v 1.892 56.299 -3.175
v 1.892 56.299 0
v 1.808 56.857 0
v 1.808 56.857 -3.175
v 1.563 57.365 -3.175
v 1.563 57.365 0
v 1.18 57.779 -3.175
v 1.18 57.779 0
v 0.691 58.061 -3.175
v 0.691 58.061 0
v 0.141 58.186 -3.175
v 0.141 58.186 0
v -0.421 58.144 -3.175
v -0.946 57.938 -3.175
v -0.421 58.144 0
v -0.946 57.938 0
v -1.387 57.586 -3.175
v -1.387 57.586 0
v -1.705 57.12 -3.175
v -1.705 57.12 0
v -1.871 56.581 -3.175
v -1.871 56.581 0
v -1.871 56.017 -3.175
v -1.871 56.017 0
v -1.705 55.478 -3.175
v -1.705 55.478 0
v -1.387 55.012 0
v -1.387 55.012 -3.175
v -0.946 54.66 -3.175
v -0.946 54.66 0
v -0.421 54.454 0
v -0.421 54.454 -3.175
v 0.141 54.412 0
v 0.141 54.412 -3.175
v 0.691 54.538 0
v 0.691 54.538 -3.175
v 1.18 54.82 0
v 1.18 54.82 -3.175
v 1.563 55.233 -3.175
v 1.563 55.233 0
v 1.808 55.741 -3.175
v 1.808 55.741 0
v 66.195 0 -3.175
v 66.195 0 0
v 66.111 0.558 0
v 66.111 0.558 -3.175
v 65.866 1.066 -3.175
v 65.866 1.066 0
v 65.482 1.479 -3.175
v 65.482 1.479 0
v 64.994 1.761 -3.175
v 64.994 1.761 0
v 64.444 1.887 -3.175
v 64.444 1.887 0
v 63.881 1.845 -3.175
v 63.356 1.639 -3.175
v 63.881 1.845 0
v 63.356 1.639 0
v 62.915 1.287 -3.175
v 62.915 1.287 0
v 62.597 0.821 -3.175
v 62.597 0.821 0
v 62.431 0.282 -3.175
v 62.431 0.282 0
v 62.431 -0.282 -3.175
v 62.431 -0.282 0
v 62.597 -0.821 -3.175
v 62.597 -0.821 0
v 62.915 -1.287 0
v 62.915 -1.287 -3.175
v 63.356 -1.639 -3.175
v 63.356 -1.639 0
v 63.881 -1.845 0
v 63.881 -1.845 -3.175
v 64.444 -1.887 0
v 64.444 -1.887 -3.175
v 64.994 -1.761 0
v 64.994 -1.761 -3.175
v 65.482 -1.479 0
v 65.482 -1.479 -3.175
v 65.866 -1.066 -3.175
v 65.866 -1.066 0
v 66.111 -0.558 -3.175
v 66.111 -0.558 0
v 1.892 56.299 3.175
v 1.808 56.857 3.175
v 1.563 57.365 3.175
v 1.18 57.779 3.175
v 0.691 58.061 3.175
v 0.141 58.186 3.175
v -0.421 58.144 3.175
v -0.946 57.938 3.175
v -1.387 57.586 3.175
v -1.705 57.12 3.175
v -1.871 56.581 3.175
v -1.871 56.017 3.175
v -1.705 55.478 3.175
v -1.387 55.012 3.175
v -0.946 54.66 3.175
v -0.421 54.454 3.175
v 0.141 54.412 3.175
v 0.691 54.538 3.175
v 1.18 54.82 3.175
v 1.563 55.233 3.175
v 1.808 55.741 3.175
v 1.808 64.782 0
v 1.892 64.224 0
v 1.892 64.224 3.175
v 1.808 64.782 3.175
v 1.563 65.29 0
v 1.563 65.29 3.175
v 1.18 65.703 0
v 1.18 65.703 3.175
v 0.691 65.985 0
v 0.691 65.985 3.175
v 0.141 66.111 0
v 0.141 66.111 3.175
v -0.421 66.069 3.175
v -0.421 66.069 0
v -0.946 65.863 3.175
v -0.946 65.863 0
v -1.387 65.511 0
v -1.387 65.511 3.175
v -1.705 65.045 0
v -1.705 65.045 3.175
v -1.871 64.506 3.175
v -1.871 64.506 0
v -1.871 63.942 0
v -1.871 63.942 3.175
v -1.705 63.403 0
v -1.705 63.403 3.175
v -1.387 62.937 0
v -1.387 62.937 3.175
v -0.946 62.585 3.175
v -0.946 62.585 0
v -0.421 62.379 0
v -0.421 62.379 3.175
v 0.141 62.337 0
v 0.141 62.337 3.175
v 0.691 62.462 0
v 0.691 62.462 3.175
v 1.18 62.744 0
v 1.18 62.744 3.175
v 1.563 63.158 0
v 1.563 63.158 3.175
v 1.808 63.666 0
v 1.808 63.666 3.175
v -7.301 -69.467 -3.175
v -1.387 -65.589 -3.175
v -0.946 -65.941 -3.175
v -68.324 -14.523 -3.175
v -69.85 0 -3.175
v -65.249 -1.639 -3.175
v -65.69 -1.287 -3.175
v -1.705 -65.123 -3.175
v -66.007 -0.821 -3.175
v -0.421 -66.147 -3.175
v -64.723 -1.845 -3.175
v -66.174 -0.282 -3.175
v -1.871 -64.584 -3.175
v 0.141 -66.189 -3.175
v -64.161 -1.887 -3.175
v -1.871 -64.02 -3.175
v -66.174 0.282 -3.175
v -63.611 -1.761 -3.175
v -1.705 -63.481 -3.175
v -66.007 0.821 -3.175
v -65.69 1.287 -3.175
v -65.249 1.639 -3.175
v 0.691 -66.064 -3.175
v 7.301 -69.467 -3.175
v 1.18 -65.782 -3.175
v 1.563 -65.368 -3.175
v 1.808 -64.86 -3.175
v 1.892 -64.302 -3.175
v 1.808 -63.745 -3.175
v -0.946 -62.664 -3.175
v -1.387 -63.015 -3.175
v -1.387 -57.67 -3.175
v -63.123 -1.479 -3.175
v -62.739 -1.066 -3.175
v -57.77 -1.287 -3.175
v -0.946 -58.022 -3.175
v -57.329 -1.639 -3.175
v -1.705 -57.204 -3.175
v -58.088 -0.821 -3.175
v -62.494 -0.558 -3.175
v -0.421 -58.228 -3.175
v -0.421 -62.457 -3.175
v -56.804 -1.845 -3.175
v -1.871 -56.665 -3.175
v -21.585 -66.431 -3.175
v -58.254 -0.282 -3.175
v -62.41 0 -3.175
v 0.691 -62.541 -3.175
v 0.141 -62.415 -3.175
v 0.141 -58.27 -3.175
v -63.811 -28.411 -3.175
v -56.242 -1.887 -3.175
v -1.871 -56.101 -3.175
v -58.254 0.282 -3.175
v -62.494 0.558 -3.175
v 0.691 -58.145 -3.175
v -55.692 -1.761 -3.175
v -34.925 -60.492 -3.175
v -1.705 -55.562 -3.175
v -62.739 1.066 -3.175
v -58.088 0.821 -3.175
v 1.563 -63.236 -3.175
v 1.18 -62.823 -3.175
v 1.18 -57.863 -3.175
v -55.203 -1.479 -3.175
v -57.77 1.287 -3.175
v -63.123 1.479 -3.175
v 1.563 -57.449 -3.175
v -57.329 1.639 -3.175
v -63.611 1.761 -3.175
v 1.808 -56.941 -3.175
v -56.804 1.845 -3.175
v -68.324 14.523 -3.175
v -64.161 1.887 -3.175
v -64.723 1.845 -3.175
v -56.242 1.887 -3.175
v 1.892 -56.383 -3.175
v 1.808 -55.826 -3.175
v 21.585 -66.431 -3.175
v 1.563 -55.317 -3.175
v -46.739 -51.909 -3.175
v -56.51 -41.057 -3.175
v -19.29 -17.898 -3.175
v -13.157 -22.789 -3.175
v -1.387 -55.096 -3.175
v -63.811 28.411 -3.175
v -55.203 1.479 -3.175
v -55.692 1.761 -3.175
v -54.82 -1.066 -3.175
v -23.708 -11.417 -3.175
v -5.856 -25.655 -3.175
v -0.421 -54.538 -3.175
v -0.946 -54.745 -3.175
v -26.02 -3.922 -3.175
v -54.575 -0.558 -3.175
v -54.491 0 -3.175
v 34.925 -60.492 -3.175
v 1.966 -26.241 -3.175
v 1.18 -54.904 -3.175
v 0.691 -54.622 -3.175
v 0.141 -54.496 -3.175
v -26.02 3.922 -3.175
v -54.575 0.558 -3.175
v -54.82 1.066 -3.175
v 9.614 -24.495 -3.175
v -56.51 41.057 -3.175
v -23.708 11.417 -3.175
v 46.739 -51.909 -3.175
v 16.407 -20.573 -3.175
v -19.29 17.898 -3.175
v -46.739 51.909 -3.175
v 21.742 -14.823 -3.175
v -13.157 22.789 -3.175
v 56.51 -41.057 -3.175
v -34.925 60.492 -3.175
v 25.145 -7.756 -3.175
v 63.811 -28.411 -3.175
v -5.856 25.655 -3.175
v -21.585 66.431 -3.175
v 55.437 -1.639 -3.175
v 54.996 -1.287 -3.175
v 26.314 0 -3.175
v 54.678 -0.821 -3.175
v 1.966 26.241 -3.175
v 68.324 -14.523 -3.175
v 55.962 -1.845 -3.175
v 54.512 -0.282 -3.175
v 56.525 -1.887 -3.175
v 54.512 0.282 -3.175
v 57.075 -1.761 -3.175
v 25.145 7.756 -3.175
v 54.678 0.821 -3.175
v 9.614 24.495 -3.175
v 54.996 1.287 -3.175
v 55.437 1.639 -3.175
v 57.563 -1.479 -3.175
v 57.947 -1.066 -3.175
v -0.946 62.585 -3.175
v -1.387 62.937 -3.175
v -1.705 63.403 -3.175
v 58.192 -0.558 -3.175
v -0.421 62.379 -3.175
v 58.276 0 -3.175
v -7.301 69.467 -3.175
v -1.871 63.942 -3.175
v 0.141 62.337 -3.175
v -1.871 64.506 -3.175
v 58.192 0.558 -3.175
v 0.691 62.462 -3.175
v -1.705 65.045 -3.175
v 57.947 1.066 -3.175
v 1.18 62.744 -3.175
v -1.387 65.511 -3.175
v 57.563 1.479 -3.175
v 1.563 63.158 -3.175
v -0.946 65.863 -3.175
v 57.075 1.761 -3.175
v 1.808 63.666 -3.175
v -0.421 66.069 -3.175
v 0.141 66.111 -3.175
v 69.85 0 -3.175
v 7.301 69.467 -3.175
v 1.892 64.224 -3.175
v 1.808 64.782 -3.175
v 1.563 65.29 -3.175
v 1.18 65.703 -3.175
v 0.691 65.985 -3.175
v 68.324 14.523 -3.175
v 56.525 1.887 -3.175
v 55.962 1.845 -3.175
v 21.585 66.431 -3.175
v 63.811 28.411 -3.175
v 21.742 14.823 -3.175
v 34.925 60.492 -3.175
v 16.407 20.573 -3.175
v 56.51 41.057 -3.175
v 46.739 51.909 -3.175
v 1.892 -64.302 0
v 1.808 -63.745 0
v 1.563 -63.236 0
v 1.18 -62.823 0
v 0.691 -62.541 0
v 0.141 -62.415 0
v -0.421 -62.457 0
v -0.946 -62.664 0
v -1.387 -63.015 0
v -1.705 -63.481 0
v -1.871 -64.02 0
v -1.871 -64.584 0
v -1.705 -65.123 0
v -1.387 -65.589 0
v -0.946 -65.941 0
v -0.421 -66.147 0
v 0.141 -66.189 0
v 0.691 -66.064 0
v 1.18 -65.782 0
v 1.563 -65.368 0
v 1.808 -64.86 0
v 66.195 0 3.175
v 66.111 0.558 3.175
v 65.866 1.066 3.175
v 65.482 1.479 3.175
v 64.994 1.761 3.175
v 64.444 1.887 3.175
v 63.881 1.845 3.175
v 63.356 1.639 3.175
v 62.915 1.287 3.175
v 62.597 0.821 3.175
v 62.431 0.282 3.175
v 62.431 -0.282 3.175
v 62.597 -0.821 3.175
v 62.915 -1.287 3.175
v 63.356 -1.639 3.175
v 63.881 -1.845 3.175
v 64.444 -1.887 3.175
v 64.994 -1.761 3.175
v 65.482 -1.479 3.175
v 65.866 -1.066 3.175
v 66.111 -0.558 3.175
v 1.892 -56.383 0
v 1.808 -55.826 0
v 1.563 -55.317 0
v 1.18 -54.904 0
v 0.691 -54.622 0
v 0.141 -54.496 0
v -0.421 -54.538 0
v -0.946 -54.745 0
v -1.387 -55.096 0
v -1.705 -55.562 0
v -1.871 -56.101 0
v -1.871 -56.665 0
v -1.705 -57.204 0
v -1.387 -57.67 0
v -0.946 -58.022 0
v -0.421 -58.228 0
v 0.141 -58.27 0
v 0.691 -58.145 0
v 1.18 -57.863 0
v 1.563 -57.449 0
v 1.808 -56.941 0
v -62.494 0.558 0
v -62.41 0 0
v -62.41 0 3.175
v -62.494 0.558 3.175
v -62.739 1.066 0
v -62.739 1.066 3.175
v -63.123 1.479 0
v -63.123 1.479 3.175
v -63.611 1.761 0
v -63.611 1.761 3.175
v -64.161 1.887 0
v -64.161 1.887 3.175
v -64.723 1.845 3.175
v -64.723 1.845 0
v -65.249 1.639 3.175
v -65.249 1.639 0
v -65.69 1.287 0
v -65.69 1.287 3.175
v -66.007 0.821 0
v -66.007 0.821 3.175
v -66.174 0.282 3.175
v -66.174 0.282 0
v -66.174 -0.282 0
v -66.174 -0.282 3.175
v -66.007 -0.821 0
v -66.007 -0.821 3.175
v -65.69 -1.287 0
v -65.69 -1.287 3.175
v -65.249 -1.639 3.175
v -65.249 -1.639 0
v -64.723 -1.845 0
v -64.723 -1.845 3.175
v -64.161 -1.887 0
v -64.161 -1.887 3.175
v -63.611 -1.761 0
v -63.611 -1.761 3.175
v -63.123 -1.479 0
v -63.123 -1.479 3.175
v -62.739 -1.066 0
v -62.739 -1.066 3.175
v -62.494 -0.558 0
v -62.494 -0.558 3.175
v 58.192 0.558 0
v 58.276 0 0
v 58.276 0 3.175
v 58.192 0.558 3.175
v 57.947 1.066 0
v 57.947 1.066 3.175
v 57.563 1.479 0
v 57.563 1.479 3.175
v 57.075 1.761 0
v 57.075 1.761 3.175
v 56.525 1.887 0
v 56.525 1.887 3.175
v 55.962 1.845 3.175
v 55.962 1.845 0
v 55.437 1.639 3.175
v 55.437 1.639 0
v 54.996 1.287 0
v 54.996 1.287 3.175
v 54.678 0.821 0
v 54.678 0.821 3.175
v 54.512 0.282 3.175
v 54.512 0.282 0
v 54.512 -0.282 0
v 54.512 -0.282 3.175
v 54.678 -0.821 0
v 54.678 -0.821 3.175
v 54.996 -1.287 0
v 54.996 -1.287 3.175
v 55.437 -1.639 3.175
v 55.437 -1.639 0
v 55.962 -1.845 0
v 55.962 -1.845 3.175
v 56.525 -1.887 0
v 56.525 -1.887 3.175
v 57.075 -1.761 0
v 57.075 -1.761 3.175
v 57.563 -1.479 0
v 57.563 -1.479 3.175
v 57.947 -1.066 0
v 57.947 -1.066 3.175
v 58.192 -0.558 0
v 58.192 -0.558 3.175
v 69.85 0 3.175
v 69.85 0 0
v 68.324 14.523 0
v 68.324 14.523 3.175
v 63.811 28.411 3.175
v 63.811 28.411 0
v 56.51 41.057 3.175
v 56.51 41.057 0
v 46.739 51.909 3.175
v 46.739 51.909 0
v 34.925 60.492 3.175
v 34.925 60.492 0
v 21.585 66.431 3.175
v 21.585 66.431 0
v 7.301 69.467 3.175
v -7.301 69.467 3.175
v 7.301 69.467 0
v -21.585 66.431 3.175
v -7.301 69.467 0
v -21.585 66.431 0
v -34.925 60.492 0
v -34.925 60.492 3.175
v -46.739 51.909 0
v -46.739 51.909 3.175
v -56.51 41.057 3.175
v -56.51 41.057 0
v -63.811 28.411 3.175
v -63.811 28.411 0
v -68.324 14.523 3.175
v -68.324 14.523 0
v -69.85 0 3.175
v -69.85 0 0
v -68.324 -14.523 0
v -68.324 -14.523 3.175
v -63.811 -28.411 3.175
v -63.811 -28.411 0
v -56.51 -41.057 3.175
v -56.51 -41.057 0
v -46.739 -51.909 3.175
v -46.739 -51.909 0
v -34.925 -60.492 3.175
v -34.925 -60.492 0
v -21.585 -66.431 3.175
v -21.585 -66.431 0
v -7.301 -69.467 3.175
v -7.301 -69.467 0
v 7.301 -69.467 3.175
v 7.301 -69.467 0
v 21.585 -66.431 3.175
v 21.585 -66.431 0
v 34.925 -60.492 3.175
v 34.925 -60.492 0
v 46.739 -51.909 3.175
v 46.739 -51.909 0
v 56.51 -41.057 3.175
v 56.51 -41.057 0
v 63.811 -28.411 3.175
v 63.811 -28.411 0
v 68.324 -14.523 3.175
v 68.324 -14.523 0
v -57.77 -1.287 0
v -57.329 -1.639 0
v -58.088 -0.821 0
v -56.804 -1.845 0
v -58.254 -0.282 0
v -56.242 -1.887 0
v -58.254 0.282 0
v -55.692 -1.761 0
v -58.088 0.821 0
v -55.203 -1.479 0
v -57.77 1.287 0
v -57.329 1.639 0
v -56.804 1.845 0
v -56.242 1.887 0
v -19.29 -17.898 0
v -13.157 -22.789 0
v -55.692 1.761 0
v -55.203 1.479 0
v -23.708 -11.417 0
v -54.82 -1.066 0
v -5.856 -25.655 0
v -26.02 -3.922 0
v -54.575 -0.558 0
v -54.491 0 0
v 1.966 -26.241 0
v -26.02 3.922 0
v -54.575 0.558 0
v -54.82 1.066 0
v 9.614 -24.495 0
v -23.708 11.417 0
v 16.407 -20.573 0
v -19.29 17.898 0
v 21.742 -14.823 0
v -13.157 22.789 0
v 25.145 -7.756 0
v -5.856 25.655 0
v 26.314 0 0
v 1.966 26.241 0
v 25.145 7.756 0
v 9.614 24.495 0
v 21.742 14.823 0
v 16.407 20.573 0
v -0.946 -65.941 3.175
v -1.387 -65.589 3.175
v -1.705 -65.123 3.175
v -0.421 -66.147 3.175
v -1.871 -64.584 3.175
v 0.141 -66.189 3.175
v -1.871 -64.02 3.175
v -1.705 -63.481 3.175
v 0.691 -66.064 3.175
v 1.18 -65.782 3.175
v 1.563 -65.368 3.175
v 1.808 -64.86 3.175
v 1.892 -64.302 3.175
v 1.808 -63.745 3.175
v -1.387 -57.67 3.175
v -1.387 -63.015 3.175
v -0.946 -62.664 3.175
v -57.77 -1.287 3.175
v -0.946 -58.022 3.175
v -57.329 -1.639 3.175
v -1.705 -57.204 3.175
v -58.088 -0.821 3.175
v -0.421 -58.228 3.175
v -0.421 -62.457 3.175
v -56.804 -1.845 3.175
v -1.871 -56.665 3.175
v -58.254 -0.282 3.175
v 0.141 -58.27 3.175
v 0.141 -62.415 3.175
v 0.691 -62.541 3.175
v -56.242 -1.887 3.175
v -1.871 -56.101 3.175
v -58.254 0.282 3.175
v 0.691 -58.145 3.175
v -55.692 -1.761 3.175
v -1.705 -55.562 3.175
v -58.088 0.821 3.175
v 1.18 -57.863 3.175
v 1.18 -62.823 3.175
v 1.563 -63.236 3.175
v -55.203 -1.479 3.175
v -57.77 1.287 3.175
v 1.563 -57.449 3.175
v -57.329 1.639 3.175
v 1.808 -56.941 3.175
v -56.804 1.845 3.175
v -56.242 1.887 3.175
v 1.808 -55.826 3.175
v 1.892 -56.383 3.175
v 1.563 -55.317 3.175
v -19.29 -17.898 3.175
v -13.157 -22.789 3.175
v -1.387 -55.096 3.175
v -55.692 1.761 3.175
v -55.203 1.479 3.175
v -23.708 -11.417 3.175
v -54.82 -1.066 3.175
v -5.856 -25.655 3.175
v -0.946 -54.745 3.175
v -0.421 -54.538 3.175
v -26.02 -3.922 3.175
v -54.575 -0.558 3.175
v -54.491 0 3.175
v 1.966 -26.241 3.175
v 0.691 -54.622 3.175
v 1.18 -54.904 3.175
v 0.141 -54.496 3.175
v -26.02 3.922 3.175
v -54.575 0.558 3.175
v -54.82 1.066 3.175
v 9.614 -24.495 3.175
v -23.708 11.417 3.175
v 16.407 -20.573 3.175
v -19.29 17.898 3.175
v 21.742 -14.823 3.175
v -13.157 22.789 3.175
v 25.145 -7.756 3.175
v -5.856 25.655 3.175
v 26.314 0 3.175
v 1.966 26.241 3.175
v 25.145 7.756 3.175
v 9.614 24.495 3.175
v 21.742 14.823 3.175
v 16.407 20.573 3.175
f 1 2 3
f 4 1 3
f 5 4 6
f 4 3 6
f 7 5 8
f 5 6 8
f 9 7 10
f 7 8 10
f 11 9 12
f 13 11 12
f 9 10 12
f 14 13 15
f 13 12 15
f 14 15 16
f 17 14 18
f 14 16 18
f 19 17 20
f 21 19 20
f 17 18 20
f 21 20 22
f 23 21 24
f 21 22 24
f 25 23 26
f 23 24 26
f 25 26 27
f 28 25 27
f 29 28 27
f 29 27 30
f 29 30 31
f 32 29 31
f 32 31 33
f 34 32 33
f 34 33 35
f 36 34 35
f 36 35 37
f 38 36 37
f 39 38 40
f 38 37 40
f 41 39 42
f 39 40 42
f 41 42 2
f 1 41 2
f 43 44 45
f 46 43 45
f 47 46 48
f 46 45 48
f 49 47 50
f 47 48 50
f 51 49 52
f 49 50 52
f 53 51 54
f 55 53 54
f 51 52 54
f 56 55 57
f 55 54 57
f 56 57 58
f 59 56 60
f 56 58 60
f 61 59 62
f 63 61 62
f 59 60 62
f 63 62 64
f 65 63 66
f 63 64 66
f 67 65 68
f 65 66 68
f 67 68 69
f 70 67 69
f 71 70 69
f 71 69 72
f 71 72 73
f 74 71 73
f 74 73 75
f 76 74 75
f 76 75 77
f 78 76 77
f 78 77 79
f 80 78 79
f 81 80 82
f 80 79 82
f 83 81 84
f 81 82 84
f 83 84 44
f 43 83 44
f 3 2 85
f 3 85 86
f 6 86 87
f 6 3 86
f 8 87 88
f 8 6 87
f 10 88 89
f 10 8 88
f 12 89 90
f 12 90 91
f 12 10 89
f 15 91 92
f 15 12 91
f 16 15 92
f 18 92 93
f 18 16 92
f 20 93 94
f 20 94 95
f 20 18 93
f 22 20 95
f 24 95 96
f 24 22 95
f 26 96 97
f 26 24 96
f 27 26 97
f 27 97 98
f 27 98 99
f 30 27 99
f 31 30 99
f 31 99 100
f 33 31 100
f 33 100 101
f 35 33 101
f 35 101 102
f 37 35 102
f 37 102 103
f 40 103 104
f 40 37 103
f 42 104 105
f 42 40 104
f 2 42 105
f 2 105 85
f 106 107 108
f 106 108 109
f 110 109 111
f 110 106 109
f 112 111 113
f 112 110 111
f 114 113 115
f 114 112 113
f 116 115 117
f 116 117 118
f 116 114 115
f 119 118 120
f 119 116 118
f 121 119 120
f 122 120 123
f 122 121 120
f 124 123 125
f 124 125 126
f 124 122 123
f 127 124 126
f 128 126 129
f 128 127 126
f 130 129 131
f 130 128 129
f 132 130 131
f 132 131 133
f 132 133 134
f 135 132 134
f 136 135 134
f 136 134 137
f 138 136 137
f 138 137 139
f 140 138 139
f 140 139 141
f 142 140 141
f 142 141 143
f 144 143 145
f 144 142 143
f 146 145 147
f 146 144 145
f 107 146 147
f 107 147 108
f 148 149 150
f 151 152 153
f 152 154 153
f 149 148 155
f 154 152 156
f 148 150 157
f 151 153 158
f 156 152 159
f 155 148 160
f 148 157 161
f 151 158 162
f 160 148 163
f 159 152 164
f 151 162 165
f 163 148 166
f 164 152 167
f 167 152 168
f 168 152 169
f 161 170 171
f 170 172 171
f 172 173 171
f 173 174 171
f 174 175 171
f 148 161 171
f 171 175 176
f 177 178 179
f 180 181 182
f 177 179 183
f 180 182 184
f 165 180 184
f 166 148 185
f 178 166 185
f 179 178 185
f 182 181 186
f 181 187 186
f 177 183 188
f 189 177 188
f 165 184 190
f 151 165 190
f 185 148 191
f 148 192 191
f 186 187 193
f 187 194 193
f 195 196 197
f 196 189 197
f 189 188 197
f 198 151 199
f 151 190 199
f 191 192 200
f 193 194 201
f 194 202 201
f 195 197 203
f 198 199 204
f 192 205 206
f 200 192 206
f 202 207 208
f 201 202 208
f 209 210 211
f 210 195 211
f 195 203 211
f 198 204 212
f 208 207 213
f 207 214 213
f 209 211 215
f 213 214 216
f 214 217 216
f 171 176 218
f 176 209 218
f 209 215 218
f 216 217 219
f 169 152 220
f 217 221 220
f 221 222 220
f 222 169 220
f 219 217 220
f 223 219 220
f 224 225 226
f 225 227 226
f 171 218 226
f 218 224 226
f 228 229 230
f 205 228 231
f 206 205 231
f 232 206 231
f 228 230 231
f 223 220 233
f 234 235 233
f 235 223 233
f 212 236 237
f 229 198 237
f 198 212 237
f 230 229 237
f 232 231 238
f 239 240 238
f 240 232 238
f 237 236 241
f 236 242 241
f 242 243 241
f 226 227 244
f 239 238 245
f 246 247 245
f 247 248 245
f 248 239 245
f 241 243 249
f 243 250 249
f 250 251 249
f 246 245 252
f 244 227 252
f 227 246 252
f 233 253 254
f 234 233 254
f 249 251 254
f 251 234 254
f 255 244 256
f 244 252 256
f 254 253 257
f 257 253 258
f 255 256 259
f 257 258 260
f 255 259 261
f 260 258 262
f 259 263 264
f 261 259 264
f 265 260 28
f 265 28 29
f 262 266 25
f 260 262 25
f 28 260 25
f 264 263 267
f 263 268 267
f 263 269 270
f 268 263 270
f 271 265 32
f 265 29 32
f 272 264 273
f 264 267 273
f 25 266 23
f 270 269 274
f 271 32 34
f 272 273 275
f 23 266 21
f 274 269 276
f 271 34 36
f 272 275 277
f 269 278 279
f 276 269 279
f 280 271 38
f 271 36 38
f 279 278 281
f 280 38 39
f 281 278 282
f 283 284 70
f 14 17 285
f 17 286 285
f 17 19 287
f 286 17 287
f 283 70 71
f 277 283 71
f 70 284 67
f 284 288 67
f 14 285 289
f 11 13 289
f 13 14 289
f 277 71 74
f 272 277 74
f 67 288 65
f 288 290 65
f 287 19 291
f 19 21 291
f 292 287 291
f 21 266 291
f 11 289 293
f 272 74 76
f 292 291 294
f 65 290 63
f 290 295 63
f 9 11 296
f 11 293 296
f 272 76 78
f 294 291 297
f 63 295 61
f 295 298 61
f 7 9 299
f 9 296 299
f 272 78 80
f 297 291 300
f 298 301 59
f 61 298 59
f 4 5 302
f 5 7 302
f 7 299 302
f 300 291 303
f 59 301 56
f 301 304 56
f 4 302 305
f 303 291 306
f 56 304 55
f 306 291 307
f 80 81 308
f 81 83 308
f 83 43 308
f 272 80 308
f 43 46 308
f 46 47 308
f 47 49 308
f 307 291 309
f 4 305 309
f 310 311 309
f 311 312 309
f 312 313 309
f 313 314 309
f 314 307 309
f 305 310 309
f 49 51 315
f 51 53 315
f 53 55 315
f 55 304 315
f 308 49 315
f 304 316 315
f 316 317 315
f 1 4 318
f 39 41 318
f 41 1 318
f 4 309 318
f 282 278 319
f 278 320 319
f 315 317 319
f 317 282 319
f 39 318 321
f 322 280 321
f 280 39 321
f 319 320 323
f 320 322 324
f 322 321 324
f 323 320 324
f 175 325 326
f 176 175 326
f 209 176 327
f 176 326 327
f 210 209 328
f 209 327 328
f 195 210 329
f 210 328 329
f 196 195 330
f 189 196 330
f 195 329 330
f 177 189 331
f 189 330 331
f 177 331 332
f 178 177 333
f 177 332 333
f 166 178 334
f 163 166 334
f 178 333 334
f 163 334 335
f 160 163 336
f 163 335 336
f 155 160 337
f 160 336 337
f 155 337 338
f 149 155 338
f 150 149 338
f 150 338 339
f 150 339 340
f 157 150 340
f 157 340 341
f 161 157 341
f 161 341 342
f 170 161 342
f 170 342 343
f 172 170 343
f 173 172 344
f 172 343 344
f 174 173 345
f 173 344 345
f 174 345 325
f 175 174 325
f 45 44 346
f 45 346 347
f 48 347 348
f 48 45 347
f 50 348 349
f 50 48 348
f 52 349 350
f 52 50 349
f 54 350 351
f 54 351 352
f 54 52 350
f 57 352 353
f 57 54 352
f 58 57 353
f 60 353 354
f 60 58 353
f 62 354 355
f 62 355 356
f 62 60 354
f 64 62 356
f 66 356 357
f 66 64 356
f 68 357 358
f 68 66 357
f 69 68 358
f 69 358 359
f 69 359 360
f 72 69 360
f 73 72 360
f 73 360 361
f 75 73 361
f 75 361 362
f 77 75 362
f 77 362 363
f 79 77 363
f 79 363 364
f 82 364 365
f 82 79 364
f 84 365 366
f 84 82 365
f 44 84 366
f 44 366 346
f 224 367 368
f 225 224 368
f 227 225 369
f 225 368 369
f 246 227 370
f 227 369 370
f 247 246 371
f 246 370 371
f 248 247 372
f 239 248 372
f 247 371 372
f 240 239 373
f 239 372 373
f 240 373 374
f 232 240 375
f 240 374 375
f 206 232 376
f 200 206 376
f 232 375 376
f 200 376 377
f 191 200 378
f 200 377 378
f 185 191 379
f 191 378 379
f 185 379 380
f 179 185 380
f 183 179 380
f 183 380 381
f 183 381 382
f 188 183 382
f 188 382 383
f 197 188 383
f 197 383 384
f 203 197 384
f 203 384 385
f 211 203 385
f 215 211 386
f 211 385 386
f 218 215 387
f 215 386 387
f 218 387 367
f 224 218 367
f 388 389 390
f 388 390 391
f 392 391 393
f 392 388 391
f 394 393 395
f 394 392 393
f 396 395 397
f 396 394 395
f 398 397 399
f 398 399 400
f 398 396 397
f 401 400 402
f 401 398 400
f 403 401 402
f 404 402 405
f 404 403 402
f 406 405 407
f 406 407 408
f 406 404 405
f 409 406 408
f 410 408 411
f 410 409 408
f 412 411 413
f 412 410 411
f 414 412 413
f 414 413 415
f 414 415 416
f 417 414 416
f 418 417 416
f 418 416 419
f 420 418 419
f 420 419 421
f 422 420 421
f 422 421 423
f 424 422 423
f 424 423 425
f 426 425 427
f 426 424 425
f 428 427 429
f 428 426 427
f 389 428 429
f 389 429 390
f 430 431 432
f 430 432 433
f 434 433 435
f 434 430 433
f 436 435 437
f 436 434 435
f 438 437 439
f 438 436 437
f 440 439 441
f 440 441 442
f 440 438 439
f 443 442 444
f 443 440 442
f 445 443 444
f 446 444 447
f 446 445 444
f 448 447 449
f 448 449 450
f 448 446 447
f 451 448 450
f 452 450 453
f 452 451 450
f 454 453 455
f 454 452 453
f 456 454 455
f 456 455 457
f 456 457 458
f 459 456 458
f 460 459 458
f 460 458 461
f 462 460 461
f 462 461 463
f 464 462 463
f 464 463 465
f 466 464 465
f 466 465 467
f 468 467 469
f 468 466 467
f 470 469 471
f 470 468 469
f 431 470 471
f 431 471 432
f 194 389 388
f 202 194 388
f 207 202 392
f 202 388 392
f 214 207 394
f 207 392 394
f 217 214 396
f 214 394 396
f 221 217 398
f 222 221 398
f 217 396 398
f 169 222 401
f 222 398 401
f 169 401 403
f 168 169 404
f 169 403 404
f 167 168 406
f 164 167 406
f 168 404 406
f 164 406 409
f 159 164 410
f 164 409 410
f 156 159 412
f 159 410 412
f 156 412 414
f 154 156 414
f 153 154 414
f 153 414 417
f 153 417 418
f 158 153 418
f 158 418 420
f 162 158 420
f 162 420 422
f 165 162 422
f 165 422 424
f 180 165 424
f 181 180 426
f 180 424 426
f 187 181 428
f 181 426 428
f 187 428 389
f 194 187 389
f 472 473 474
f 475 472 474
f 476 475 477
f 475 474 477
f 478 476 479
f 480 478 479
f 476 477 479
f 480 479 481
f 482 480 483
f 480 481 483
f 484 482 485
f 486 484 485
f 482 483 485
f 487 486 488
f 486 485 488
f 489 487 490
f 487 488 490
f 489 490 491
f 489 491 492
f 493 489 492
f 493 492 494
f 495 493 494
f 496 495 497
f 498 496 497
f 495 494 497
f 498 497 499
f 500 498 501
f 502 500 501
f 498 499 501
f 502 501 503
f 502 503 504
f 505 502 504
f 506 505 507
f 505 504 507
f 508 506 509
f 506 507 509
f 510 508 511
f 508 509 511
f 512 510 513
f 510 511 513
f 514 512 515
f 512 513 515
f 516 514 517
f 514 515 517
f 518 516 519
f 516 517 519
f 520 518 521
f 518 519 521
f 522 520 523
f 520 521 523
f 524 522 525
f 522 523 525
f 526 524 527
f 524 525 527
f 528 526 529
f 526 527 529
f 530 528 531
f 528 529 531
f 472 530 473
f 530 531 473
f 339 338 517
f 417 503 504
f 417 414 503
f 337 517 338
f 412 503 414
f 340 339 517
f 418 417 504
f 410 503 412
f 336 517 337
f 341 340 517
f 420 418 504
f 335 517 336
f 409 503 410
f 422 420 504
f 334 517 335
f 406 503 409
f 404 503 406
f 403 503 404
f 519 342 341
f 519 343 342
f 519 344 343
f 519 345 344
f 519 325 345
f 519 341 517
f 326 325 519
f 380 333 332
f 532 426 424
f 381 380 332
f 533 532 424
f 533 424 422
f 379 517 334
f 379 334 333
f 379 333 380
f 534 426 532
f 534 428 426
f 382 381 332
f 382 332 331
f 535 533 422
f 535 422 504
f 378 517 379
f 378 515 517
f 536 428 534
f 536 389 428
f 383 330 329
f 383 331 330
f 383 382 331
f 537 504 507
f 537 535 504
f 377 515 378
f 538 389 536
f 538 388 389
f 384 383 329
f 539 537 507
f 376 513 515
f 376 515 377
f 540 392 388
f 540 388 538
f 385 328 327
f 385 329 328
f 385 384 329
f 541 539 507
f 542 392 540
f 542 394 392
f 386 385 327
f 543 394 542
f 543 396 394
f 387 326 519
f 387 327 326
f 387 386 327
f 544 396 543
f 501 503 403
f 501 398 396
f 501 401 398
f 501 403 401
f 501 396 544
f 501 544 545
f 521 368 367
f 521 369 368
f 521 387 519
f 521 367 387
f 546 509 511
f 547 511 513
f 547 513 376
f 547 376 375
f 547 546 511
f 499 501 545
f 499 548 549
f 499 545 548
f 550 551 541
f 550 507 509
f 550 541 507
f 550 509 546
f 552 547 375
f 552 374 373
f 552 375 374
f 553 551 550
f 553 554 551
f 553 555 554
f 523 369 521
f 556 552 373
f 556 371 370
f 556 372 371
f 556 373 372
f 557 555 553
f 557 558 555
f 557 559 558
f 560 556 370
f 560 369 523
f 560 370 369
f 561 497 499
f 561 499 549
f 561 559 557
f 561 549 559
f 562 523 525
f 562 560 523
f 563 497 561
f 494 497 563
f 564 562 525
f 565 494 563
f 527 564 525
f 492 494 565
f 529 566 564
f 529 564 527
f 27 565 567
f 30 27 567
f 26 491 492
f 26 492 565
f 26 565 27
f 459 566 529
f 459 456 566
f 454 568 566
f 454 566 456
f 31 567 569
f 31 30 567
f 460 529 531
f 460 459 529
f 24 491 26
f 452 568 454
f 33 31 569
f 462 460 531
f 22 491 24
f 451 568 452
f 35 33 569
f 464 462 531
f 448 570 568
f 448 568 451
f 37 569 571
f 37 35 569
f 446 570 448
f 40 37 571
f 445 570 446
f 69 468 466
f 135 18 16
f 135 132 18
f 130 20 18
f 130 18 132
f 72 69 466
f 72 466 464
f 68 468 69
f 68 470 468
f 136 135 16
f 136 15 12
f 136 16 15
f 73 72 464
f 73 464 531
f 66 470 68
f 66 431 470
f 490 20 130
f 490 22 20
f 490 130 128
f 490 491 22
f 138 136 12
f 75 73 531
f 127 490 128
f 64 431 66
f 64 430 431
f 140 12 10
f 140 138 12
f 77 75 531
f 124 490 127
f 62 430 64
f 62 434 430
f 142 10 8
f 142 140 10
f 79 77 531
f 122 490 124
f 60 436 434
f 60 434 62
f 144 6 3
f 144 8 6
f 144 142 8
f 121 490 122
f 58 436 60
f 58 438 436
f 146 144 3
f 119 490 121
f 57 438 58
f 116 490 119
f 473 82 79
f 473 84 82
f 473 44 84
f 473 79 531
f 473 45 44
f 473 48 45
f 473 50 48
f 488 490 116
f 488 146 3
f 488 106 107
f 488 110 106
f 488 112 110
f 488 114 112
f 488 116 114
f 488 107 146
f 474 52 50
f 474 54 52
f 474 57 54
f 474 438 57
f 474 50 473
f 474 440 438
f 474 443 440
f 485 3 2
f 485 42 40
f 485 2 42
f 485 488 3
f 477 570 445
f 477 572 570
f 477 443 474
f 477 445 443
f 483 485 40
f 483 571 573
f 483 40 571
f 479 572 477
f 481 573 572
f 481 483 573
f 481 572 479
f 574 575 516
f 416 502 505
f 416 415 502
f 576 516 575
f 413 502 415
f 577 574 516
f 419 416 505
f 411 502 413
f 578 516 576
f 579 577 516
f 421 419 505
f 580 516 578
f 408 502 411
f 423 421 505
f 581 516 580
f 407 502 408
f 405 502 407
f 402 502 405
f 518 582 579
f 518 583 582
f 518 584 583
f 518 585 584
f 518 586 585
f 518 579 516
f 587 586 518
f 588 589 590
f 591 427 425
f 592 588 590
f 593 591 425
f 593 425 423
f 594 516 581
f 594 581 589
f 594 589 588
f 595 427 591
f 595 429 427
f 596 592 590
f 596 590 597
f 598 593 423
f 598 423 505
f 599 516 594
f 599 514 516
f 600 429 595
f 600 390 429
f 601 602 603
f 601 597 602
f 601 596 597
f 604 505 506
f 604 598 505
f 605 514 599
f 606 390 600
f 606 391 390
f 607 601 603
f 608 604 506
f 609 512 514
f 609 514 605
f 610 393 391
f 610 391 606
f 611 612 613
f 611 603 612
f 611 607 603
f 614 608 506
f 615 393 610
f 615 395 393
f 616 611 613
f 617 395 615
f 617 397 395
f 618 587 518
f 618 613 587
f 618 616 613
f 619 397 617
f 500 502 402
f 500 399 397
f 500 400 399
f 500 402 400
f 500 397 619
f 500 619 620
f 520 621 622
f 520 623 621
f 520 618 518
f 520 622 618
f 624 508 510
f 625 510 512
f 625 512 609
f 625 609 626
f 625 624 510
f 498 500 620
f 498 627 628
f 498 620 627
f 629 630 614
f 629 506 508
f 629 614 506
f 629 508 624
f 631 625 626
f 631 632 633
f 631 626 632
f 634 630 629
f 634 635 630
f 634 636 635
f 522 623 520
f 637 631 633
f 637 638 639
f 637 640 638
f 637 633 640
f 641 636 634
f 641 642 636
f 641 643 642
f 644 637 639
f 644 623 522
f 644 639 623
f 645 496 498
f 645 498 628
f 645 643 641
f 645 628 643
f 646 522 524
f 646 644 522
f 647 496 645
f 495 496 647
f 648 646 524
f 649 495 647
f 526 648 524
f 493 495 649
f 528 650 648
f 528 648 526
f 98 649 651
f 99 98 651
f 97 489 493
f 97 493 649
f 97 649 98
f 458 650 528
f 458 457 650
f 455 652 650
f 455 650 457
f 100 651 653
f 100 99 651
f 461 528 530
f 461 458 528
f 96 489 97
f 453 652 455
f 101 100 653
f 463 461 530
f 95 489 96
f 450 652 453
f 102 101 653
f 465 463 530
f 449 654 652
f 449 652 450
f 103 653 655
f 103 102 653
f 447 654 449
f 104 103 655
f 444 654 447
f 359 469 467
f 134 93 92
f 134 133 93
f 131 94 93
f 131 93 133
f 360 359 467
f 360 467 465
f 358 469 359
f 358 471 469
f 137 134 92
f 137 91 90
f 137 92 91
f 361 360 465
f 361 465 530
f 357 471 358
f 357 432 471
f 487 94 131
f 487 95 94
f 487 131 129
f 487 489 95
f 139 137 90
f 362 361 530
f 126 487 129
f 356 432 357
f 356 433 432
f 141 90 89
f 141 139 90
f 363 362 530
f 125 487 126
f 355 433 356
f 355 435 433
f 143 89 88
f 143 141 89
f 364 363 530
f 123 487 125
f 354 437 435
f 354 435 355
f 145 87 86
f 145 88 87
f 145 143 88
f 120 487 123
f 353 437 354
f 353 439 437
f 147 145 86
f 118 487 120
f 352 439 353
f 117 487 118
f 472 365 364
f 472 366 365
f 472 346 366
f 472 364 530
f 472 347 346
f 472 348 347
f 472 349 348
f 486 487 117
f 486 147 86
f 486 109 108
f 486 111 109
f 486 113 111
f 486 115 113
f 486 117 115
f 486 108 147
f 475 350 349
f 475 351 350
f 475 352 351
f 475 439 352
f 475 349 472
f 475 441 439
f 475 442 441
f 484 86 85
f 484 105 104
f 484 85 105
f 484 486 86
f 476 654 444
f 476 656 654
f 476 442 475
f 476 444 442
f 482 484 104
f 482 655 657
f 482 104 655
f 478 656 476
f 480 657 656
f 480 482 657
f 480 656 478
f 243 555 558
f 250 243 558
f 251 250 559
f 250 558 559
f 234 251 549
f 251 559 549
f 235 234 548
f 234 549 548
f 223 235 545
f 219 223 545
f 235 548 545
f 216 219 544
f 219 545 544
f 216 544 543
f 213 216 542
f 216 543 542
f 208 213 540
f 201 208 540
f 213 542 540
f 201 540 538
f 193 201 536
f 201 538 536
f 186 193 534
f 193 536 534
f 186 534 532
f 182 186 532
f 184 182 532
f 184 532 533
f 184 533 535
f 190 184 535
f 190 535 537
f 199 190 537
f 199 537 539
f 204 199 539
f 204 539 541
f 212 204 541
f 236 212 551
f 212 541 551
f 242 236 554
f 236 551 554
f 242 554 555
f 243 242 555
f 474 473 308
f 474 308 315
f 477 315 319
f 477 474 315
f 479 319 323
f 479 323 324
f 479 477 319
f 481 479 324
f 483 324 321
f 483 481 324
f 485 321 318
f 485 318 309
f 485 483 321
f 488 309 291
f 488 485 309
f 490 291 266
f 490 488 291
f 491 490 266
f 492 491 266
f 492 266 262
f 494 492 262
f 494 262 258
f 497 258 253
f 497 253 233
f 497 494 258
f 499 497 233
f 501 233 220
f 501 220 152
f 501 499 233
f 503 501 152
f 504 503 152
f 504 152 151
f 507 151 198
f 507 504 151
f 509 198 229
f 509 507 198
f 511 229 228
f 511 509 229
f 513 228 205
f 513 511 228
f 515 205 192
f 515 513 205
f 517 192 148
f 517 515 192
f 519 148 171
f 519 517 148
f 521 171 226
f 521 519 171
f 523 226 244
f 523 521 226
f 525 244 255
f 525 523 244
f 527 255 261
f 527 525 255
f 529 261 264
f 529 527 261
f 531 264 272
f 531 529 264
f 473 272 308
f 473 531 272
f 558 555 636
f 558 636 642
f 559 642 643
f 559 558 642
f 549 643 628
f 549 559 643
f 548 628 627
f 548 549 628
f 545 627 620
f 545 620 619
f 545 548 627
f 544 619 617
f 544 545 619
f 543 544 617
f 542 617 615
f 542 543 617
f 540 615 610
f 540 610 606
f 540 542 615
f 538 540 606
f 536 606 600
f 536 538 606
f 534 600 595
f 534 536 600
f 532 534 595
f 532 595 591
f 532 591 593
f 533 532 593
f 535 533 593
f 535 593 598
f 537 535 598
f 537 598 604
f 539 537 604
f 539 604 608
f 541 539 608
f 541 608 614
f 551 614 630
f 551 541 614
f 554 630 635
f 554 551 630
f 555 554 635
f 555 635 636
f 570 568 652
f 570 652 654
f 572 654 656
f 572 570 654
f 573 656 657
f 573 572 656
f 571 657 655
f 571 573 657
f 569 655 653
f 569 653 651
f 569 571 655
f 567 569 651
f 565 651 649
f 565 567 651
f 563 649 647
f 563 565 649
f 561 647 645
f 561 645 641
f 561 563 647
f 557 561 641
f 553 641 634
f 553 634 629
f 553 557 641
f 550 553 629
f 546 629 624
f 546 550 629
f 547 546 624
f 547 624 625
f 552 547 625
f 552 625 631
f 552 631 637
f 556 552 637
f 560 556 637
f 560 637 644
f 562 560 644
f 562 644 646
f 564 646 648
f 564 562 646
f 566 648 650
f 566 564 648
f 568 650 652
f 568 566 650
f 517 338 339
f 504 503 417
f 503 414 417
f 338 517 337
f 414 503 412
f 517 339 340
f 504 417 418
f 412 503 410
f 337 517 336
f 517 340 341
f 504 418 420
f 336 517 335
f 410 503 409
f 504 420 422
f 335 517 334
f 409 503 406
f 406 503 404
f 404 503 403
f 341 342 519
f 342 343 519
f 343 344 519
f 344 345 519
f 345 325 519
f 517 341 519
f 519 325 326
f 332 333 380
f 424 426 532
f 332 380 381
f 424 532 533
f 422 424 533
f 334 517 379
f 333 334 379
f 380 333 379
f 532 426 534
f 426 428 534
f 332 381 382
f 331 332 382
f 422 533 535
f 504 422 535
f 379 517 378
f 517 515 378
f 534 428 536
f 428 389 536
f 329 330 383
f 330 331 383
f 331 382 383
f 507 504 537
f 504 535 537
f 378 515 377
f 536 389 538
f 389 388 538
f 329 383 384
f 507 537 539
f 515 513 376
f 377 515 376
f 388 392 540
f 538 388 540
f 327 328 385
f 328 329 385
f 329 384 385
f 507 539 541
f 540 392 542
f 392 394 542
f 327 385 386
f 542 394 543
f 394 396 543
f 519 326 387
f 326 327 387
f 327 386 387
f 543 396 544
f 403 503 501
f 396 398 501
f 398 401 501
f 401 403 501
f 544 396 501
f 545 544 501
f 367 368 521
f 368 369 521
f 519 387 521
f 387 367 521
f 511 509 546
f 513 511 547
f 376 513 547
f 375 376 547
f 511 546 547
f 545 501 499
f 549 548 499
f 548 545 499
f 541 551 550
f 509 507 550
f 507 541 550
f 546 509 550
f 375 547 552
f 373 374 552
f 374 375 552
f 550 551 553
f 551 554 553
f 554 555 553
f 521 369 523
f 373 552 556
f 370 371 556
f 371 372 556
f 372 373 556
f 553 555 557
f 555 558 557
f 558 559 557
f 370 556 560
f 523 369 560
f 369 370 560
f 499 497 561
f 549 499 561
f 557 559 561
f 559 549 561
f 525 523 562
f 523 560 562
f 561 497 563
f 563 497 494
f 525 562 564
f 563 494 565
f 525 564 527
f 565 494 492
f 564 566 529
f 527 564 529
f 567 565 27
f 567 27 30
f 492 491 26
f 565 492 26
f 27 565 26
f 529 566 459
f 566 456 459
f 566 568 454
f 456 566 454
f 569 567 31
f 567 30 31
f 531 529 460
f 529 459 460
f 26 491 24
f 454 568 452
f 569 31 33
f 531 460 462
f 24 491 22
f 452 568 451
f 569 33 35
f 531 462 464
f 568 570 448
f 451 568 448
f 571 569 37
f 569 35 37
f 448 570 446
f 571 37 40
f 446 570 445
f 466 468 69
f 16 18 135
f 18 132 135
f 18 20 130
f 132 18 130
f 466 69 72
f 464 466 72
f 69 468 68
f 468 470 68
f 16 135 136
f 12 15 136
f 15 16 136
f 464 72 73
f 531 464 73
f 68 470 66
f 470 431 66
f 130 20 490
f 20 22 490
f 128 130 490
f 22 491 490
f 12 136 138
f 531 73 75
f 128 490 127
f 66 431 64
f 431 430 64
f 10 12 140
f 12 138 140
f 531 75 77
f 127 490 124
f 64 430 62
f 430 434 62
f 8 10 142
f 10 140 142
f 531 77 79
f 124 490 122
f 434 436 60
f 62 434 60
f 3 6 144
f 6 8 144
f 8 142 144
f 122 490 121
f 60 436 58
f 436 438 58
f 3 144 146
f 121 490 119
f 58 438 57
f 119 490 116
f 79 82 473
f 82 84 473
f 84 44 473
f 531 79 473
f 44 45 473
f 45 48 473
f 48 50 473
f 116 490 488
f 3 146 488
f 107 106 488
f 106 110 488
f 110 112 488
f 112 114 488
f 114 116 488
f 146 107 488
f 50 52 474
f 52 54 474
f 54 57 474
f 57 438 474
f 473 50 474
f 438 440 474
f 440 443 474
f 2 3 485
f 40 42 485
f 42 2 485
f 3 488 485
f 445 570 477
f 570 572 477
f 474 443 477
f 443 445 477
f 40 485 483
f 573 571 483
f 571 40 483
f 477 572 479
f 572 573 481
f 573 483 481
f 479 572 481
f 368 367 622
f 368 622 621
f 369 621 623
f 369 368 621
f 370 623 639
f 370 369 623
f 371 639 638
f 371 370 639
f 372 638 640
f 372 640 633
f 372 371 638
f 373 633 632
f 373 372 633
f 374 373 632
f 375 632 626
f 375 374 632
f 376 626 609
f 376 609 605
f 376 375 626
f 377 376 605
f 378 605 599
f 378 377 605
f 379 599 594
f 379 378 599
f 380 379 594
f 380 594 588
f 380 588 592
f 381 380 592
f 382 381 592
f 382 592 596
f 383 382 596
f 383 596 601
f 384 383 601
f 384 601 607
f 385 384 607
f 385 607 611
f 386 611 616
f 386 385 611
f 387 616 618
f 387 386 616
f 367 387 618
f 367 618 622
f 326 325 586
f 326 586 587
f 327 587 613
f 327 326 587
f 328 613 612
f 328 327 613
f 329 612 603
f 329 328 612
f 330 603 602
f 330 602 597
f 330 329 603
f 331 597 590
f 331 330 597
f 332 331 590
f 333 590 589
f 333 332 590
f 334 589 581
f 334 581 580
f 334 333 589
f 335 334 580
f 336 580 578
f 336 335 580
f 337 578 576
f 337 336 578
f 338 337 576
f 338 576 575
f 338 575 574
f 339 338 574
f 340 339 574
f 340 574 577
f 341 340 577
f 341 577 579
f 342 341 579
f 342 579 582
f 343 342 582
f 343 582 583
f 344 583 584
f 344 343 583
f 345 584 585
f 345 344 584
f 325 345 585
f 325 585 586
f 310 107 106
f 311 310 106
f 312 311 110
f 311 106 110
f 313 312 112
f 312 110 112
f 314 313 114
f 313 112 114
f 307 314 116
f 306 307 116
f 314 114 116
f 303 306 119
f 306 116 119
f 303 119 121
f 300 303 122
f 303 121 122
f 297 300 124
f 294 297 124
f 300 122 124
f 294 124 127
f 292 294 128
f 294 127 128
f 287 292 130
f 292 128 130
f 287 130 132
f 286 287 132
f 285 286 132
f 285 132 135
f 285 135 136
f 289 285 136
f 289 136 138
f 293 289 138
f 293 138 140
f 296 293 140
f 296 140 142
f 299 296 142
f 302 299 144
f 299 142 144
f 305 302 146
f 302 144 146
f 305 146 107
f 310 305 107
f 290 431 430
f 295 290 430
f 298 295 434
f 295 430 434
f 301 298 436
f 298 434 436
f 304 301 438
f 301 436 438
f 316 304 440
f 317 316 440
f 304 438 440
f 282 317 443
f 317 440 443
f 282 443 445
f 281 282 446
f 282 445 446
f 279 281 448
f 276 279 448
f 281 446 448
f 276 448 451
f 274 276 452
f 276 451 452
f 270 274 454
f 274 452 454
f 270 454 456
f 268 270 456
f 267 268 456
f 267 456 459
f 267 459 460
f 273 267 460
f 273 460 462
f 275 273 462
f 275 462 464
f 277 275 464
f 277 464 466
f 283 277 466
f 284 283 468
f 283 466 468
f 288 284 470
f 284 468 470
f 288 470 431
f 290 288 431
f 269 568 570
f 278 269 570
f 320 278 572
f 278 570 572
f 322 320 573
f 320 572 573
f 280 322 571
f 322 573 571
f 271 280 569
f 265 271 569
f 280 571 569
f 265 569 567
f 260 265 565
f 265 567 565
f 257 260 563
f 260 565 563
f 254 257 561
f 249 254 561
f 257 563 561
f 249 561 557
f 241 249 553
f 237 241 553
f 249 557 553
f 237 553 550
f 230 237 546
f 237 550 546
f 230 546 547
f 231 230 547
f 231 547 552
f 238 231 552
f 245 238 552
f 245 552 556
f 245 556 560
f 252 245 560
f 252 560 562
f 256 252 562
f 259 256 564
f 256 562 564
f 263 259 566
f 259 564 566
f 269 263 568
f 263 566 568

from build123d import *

# Parameters (mm, degrees)
F0_R     = 69.85
F0_R_2   = 1.8923
F0_R_3   = 26.3144
F1_DEPTH = 3.175
F3_DEPTH = 3.175


# Not quite as in the source:
# - a feature names something its author has since deleted; it is built from what else it names


with BuildPart() as f1:
    # F0 (on Top) → F1 (new body)
    with BuildSketch(Plane.XY):
        Circle(F0_R)
        with Locations((0, -64.3023502119)):
            Circle(F0_R_2, mode=Mode.SUBTRACT)
        with Locations((0, -56.38329491)):
            Circle(F0_R_2, mode=Mode.SUBTRACT)
        with Locations((-64.3023502119, 0)):
            Circle(F0_R_2, mode=Mode.SUBTRACT)
        with Locations((-56.38329491, 0)):
            Circle(F0_R_2, mode=Mode.SUBTRACT)
        Circle(F0_R_3, mode=Mode.SUBTRACT)
        with Locations((56.38329491, 0)):
            Circle(F0_R_2, mode=Mode.SUBTRACT)
        with Locations((64.3023502119, 0)):
            Circle(F0_R_2, mode=Mode.SUBTRACT)
        with Locations((0, 56.2991)):
            Circle(F0_R_2, mode=Mode.SUBTRACT)
        with Locations((0, 64.2239)):
            Circle(F0_R_2, mode=Mode.SUBTRACT)
    extrude(amount=-F1_DEPTH)


with BuildPart() as f3:
    # F0 (on Top) → F3 (new body)
    with BuildSketch(Plane.XY):
        Circle(F0_R)
        with Locations((0, -64.3023502119)):
            Circle(F0_R_2, mode=Mode.SUBTRACT)
        with Locations((0, -56.38329491)):
            Circle(F0_R_2, mode=Mode.SUBTRACT)
        with Locations((-64.3023502119, 0)):
            Circle(F0_R_2, mode=Mode.SUBTRACT)
        with Locations((-56.38329491, 0)):
            Circle(F0_R_2, mode=Mode.SUBTRACT)
        Circle(F0_R_3, mode=Mode.SUBTRACT)
        with Locations((56.38329491, 0)):
            Circle(F0_R_2, mode=Mode.SUBTRACT)
        with Locations((64.3023502119, 0)):
            Circle(F0_R_2, mode=Mode.SUBTRACT)
        with Locations((0, 56.2991)):
            Circle(F0_R_2, mode=Mode.SUBTRACT)
        with Locations((0, 64.2239)):
            Circle(F0_R_2, mode=Mode.SUBTRACT)
    extrude(amount=F3_DEPTH)


solid = Compound([f1.part, f3.part])
